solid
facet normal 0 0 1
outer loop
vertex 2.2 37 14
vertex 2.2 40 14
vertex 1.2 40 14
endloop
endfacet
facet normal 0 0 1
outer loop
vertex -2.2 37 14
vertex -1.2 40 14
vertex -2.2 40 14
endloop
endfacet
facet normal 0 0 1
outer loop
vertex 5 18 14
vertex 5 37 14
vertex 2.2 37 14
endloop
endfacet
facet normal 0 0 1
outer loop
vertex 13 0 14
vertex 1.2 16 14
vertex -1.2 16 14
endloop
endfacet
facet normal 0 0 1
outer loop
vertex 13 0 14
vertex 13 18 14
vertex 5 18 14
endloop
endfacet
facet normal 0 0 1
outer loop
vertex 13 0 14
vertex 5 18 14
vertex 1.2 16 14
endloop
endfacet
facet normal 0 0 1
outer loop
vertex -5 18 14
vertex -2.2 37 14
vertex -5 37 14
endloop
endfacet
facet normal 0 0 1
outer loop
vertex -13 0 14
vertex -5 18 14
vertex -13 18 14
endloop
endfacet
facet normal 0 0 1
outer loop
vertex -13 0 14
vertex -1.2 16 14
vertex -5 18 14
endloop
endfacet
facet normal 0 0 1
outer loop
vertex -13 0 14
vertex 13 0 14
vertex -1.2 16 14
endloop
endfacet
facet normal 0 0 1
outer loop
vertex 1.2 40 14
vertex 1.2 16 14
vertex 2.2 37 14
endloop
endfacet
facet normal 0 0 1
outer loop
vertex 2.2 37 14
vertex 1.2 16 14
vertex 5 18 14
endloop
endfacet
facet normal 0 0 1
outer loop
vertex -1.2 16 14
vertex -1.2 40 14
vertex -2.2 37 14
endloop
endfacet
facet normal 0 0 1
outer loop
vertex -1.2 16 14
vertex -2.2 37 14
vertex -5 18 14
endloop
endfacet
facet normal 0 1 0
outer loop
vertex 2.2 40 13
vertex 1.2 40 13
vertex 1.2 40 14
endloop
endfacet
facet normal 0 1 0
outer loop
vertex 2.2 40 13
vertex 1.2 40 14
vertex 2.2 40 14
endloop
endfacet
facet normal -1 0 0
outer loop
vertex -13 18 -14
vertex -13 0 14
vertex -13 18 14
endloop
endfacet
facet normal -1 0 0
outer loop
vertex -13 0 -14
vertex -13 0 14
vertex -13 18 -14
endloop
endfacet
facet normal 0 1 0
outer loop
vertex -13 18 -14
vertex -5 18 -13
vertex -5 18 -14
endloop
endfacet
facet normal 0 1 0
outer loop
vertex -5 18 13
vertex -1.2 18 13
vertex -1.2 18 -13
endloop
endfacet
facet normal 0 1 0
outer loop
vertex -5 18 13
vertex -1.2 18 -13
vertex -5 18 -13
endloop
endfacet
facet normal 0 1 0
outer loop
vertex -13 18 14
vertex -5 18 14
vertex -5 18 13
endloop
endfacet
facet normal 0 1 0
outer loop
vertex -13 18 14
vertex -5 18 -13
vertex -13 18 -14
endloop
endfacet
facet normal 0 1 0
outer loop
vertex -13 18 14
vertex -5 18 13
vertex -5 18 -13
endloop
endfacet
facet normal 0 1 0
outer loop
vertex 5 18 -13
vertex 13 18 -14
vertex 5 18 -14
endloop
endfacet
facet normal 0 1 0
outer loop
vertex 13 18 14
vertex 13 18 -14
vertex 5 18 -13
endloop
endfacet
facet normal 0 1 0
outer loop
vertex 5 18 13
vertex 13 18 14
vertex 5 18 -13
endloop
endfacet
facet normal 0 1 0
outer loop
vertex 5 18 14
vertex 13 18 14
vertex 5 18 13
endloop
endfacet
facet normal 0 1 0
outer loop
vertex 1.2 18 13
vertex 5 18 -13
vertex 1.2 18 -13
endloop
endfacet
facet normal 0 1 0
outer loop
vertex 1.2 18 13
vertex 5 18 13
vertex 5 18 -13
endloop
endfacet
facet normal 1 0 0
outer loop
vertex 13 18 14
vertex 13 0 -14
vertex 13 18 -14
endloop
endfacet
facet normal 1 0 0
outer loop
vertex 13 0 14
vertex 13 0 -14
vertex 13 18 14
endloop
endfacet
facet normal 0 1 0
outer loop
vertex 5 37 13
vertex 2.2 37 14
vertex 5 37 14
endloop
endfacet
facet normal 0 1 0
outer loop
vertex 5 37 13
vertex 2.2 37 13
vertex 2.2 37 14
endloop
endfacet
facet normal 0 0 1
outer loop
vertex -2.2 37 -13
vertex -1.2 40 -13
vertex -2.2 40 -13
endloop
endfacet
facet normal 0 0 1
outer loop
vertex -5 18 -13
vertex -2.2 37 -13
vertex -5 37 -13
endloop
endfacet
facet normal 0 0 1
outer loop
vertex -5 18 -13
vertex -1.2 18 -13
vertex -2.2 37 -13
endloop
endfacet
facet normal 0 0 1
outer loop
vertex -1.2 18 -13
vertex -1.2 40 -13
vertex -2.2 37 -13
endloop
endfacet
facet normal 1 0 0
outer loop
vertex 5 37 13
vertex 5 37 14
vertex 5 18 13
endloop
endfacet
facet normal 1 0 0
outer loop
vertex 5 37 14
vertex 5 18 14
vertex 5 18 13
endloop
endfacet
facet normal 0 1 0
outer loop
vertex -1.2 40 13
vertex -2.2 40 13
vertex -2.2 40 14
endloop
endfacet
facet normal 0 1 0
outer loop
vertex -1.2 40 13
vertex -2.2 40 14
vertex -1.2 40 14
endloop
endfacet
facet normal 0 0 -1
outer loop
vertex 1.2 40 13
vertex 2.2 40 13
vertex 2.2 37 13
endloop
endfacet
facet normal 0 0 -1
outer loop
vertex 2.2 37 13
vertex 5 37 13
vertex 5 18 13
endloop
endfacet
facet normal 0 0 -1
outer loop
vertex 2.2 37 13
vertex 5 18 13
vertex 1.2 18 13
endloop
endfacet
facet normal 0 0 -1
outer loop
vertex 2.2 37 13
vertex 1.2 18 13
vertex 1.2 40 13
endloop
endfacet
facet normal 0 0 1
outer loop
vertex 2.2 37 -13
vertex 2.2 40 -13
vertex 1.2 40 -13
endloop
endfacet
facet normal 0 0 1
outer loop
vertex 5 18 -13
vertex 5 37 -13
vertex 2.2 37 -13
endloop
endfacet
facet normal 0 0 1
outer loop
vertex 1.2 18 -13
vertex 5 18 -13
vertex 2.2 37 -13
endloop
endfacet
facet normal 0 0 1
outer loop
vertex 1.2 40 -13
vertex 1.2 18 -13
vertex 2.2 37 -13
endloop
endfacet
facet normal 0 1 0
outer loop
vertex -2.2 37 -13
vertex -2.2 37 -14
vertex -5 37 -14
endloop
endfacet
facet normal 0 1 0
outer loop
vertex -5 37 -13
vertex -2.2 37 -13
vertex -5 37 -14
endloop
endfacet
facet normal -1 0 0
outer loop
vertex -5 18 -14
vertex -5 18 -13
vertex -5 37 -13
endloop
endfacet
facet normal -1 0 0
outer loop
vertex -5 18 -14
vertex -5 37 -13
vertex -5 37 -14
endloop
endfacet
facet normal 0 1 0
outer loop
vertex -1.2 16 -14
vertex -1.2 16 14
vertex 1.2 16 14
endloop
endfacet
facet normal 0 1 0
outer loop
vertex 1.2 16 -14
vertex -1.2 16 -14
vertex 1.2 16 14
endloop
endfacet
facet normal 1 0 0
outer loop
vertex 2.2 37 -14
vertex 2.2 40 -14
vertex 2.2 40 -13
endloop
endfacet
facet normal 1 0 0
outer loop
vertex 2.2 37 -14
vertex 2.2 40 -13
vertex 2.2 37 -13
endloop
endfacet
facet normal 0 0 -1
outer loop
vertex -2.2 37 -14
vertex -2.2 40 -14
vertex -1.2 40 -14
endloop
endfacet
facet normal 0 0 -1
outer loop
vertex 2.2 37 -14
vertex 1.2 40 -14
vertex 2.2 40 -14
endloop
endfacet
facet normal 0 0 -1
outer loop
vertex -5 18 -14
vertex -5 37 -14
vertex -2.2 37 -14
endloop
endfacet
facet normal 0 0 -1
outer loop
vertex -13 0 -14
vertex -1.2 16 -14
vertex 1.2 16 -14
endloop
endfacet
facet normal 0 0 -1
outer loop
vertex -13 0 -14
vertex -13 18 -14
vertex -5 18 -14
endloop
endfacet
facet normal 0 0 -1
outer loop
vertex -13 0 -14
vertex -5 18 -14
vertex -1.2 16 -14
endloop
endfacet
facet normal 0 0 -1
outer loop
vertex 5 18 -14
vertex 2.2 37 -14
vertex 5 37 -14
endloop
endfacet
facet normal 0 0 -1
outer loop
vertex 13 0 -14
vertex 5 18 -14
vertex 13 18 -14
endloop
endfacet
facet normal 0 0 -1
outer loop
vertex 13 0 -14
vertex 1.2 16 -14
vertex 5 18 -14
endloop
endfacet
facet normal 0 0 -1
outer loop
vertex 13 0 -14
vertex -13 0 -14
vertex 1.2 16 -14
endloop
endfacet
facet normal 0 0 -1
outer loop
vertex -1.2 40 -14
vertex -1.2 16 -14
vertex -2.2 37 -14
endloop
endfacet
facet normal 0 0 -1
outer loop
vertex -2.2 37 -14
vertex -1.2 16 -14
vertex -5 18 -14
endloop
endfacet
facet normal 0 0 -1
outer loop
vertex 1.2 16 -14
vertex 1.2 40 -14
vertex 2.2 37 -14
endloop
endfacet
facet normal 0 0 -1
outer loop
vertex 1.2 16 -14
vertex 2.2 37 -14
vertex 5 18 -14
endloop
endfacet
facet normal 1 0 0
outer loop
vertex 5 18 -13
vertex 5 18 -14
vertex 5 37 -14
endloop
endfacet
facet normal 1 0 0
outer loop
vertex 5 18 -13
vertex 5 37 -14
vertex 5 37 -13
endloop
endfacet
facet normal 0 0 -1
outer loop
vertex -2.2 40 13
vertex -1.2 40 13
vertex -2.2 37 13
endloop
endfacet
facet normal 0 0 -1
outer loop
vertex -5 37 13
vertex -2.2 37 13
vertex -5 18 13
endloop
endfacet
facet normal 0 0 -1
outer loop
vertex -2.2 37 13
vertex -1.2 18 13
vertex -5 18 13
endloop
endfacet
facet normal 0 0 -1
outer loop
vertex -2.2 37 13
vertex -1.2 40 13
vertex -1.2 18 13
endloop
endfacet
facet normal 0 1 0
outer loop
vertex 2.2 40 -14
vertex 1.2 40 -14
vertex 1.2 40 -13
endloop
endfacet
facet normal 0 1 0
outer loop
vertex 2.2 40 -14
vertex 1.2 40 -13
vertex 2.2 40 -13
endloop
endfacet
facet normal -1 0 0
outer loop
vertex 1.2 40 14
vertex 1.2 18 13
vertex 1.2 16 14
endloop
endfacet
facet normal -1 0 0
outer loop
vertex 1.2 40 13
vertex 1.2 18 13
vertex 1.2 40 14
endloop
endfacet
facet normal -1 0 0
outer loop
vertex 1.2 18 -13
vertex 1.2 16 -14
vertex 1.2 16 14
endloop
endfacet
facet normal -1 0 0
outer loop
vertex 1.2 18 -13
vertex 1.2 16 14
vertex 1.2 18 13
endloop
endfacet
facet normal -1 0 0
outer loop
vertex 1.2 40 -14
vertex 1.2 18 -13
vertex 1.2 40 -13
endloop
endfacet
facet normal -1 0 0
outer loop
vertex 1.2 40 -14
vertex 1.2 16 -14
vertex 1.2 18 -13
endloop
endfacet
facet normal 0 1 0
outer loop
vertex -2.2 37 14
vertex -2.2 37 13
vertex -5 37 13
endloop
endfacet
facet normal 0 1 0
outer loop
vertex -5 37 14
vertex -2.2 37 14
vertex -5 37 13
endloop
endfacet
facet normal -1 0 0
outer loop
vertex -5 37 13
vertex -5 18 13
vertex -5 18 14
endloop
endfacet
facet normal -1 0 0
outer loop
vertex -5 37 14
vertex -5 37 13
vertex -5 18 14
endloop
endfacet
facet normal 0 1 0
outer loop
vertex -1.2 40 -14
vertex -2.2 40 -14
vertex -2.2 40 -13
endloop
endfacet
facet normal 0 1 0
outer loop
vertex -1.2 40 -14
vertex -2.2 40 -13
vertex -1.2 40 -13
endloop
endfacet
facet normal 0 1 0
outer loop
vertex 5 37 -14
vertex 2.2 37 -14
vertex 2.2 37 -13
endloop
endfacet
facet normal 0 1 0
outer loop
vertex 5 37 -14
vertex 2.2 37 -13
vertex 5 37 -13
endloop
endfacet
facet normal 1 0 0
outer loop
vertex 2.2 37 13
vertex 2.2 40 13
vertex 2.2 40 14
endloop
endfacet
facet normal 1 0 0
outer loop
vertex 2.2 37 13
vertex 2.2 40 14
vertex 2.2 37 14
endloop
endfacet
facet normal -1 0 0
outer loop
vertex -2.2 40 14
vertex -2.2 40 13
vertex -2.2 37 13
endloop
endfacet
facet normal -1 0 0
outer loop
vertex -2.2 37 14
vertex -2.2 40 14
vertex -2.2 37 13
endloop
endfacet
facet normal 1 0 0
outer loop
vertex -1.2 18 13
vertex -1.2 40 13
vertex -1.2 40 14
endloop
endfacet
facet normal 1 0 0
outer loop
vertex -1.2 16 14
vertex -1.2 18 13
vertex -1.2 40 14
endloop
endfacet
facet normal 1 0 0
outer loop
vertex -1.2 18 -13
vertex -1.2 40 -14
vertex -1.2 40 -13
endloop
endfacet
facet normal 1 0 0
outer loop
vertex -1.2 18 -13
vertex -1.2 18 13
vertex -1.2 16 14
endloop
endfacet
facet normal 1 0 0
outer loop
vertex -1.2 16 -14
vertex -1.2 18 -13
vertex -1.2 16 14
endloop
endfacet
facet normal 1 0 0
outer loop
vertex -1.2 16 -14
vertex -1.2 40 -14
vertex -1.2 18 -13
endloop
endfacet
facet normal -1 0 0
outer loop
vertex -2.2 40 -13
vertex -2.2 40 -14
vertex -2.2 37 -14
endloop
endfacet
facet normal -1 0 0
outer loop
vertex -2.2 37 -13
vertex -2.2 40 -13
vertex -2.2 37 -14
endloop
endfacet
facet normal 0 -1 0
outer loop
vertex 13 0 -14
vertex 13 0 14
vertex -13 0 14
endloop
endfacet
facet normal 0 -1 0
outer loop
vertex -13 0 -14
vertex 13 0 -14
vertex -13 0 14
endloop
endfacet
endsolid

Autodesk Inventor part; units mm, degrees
ref_plane "YZ Plane" through (0, 0, 0) normal (1, 0, 0) x (0, 1, 0)
ref_plane "XZ Plane" through (0, 0, 0) normal (0, 1, 0) x (-1, 0, 0)
ref_plane "XY Plane" through (0, 0, 0) normal (0, 0, 1) x (1, 0, 0)
sketch "Sketch1" plane through (0, 0, 0) normal (0, 1, 0) x (-1, 0, 0)
  point P0 (0, 0)
sketch "Sketch2" plane through (0, 0, 0) normal (0, 1, 0) x (-1, 0, 0)
  line L0 (-13, 14) -> (13, 14)
  line L1 (13, 14) -> (13, -14)
  line L2 (13, -14) -> (-13, -14)
  line L3 (-13, -14) -> (-13, 14)
  line L4 (-13, 14) -> (13, -14) construction
  line L5 (13, 14) -> (-13, -14) construction
  point P0 (0, 0)
  dimension "d0" = 26
  dimension "d1" = 28
extrude "Extrusion1" add sketch "Sketch2" along normal blind 18
sketch "Sketch5" plane through (13, 0, 14) normal (1, 0, 0) x (0, 0, -1)
  point P0 (14, 0)
  point P1 (17, 39.5)
  point P2 (11, 39.5)
sketch "Sketch7" plane through (0, 18, 0) normal (0, 1, 0) x (1, 0, 0)
  point P0 (0, 0)
sketch "Sketch8" plane through (0, 18, 0) normal (0, 1, 0) x (1, 0, 0)
  line L0 (13, 14) -> (-13, 14) projected
  line L1 (13, 14) -> (5, 14)
  line L2 (-5, 14) -> (-4, 14)
  line L3 (-5, 14) -> (5, 14)
  line L4 (5, 14) -> (5, 13)
  line L5 (5, 13) -> (-5, 13)
  line L6 (-5, 13) -> (-5, 14)
  line L7 (-13, -14) -> (13, -14) projected
  line L8 (-5, -14) -> (5, -14)
  line L9 (5, -14) -> (5, -13)
  line L10 (5, -13) -> (-5, -13)
  line L11 (-5, -13) -> (-5, -14)
  point P0 (0, 0)
  dimension "d22" = 8
  dimension "d23" = 8
  dimension "d24" = 1
  dimension "d26" = 10
  dimension "d27" = 1
extrude "Extrusion5" add sketch "Sketch8" along normal blind 22
sketch "Sketch9" plane through (-13, 0, 14) normal (0, 0, 1) x (1, 0, 0)
  line L0 (8, 40) -> (18, 40) projected
  line L1 (10.7548, 39.8791) -> (11.7548, 39.8791) construction
  line L2 (11.7548, 15.8791) -> (14.1548, 15.8791)
  line L3 (14.1548, 15.8791) -> (14.1548, 40)
  line L4 (11.7548, 15.8791) -> (11.7548, 39.8791)
  line L5 (8, 40) -> (10.8, 40)
  line L6 (10.8, 40) -> (10.8, 37)
  line L7 (10.8, 37) -> (8, 37)
  line L8 (8, 37) -> (8, 40)
  line L9 (18, 40) -> (15.2, 40)
  line L10 (15.2, 40) -> (15.2, 37)
  line L11 (15.2, 37) -> (18, 37)
  line L12 (18, 37) -> (18, 40)
  point P0 (13, 0)
  dimension "d38" = 2.4
  dimension "d39" = 2.8
  dimension "d40" = 3
  dimension "d41" = 2.8
extrude "Extrusion6" cut sketch "Sketch9" along normal mid plane 100
sketch "Sketch10" plane through (-13, 0, 14) normal (0, 0, 1) x (1, 0, 0)
  line L0 (10.8, 40) -> (10.8, 37) projected
  line L1 (11.8, 40) -> (11.8, 16)
  line L2 (11.8, 16) -> (14.2, 16)
  line L3 (14.2, 16) -> (14.2, 40)
  line L4 (11.8, 40) -> (14.2, 40)
  line L5 (15.2, 40) -> (10.8, 40) projected
  point P0 (13, 0)
  dimension "d44" = 1
  dimension "d45" = 24
  dimension "d46" = 2.4
extrude "Extrusion7" cut sketch "Sketch10" along normal mid plane 100
properties part number "Suporte_motor"
